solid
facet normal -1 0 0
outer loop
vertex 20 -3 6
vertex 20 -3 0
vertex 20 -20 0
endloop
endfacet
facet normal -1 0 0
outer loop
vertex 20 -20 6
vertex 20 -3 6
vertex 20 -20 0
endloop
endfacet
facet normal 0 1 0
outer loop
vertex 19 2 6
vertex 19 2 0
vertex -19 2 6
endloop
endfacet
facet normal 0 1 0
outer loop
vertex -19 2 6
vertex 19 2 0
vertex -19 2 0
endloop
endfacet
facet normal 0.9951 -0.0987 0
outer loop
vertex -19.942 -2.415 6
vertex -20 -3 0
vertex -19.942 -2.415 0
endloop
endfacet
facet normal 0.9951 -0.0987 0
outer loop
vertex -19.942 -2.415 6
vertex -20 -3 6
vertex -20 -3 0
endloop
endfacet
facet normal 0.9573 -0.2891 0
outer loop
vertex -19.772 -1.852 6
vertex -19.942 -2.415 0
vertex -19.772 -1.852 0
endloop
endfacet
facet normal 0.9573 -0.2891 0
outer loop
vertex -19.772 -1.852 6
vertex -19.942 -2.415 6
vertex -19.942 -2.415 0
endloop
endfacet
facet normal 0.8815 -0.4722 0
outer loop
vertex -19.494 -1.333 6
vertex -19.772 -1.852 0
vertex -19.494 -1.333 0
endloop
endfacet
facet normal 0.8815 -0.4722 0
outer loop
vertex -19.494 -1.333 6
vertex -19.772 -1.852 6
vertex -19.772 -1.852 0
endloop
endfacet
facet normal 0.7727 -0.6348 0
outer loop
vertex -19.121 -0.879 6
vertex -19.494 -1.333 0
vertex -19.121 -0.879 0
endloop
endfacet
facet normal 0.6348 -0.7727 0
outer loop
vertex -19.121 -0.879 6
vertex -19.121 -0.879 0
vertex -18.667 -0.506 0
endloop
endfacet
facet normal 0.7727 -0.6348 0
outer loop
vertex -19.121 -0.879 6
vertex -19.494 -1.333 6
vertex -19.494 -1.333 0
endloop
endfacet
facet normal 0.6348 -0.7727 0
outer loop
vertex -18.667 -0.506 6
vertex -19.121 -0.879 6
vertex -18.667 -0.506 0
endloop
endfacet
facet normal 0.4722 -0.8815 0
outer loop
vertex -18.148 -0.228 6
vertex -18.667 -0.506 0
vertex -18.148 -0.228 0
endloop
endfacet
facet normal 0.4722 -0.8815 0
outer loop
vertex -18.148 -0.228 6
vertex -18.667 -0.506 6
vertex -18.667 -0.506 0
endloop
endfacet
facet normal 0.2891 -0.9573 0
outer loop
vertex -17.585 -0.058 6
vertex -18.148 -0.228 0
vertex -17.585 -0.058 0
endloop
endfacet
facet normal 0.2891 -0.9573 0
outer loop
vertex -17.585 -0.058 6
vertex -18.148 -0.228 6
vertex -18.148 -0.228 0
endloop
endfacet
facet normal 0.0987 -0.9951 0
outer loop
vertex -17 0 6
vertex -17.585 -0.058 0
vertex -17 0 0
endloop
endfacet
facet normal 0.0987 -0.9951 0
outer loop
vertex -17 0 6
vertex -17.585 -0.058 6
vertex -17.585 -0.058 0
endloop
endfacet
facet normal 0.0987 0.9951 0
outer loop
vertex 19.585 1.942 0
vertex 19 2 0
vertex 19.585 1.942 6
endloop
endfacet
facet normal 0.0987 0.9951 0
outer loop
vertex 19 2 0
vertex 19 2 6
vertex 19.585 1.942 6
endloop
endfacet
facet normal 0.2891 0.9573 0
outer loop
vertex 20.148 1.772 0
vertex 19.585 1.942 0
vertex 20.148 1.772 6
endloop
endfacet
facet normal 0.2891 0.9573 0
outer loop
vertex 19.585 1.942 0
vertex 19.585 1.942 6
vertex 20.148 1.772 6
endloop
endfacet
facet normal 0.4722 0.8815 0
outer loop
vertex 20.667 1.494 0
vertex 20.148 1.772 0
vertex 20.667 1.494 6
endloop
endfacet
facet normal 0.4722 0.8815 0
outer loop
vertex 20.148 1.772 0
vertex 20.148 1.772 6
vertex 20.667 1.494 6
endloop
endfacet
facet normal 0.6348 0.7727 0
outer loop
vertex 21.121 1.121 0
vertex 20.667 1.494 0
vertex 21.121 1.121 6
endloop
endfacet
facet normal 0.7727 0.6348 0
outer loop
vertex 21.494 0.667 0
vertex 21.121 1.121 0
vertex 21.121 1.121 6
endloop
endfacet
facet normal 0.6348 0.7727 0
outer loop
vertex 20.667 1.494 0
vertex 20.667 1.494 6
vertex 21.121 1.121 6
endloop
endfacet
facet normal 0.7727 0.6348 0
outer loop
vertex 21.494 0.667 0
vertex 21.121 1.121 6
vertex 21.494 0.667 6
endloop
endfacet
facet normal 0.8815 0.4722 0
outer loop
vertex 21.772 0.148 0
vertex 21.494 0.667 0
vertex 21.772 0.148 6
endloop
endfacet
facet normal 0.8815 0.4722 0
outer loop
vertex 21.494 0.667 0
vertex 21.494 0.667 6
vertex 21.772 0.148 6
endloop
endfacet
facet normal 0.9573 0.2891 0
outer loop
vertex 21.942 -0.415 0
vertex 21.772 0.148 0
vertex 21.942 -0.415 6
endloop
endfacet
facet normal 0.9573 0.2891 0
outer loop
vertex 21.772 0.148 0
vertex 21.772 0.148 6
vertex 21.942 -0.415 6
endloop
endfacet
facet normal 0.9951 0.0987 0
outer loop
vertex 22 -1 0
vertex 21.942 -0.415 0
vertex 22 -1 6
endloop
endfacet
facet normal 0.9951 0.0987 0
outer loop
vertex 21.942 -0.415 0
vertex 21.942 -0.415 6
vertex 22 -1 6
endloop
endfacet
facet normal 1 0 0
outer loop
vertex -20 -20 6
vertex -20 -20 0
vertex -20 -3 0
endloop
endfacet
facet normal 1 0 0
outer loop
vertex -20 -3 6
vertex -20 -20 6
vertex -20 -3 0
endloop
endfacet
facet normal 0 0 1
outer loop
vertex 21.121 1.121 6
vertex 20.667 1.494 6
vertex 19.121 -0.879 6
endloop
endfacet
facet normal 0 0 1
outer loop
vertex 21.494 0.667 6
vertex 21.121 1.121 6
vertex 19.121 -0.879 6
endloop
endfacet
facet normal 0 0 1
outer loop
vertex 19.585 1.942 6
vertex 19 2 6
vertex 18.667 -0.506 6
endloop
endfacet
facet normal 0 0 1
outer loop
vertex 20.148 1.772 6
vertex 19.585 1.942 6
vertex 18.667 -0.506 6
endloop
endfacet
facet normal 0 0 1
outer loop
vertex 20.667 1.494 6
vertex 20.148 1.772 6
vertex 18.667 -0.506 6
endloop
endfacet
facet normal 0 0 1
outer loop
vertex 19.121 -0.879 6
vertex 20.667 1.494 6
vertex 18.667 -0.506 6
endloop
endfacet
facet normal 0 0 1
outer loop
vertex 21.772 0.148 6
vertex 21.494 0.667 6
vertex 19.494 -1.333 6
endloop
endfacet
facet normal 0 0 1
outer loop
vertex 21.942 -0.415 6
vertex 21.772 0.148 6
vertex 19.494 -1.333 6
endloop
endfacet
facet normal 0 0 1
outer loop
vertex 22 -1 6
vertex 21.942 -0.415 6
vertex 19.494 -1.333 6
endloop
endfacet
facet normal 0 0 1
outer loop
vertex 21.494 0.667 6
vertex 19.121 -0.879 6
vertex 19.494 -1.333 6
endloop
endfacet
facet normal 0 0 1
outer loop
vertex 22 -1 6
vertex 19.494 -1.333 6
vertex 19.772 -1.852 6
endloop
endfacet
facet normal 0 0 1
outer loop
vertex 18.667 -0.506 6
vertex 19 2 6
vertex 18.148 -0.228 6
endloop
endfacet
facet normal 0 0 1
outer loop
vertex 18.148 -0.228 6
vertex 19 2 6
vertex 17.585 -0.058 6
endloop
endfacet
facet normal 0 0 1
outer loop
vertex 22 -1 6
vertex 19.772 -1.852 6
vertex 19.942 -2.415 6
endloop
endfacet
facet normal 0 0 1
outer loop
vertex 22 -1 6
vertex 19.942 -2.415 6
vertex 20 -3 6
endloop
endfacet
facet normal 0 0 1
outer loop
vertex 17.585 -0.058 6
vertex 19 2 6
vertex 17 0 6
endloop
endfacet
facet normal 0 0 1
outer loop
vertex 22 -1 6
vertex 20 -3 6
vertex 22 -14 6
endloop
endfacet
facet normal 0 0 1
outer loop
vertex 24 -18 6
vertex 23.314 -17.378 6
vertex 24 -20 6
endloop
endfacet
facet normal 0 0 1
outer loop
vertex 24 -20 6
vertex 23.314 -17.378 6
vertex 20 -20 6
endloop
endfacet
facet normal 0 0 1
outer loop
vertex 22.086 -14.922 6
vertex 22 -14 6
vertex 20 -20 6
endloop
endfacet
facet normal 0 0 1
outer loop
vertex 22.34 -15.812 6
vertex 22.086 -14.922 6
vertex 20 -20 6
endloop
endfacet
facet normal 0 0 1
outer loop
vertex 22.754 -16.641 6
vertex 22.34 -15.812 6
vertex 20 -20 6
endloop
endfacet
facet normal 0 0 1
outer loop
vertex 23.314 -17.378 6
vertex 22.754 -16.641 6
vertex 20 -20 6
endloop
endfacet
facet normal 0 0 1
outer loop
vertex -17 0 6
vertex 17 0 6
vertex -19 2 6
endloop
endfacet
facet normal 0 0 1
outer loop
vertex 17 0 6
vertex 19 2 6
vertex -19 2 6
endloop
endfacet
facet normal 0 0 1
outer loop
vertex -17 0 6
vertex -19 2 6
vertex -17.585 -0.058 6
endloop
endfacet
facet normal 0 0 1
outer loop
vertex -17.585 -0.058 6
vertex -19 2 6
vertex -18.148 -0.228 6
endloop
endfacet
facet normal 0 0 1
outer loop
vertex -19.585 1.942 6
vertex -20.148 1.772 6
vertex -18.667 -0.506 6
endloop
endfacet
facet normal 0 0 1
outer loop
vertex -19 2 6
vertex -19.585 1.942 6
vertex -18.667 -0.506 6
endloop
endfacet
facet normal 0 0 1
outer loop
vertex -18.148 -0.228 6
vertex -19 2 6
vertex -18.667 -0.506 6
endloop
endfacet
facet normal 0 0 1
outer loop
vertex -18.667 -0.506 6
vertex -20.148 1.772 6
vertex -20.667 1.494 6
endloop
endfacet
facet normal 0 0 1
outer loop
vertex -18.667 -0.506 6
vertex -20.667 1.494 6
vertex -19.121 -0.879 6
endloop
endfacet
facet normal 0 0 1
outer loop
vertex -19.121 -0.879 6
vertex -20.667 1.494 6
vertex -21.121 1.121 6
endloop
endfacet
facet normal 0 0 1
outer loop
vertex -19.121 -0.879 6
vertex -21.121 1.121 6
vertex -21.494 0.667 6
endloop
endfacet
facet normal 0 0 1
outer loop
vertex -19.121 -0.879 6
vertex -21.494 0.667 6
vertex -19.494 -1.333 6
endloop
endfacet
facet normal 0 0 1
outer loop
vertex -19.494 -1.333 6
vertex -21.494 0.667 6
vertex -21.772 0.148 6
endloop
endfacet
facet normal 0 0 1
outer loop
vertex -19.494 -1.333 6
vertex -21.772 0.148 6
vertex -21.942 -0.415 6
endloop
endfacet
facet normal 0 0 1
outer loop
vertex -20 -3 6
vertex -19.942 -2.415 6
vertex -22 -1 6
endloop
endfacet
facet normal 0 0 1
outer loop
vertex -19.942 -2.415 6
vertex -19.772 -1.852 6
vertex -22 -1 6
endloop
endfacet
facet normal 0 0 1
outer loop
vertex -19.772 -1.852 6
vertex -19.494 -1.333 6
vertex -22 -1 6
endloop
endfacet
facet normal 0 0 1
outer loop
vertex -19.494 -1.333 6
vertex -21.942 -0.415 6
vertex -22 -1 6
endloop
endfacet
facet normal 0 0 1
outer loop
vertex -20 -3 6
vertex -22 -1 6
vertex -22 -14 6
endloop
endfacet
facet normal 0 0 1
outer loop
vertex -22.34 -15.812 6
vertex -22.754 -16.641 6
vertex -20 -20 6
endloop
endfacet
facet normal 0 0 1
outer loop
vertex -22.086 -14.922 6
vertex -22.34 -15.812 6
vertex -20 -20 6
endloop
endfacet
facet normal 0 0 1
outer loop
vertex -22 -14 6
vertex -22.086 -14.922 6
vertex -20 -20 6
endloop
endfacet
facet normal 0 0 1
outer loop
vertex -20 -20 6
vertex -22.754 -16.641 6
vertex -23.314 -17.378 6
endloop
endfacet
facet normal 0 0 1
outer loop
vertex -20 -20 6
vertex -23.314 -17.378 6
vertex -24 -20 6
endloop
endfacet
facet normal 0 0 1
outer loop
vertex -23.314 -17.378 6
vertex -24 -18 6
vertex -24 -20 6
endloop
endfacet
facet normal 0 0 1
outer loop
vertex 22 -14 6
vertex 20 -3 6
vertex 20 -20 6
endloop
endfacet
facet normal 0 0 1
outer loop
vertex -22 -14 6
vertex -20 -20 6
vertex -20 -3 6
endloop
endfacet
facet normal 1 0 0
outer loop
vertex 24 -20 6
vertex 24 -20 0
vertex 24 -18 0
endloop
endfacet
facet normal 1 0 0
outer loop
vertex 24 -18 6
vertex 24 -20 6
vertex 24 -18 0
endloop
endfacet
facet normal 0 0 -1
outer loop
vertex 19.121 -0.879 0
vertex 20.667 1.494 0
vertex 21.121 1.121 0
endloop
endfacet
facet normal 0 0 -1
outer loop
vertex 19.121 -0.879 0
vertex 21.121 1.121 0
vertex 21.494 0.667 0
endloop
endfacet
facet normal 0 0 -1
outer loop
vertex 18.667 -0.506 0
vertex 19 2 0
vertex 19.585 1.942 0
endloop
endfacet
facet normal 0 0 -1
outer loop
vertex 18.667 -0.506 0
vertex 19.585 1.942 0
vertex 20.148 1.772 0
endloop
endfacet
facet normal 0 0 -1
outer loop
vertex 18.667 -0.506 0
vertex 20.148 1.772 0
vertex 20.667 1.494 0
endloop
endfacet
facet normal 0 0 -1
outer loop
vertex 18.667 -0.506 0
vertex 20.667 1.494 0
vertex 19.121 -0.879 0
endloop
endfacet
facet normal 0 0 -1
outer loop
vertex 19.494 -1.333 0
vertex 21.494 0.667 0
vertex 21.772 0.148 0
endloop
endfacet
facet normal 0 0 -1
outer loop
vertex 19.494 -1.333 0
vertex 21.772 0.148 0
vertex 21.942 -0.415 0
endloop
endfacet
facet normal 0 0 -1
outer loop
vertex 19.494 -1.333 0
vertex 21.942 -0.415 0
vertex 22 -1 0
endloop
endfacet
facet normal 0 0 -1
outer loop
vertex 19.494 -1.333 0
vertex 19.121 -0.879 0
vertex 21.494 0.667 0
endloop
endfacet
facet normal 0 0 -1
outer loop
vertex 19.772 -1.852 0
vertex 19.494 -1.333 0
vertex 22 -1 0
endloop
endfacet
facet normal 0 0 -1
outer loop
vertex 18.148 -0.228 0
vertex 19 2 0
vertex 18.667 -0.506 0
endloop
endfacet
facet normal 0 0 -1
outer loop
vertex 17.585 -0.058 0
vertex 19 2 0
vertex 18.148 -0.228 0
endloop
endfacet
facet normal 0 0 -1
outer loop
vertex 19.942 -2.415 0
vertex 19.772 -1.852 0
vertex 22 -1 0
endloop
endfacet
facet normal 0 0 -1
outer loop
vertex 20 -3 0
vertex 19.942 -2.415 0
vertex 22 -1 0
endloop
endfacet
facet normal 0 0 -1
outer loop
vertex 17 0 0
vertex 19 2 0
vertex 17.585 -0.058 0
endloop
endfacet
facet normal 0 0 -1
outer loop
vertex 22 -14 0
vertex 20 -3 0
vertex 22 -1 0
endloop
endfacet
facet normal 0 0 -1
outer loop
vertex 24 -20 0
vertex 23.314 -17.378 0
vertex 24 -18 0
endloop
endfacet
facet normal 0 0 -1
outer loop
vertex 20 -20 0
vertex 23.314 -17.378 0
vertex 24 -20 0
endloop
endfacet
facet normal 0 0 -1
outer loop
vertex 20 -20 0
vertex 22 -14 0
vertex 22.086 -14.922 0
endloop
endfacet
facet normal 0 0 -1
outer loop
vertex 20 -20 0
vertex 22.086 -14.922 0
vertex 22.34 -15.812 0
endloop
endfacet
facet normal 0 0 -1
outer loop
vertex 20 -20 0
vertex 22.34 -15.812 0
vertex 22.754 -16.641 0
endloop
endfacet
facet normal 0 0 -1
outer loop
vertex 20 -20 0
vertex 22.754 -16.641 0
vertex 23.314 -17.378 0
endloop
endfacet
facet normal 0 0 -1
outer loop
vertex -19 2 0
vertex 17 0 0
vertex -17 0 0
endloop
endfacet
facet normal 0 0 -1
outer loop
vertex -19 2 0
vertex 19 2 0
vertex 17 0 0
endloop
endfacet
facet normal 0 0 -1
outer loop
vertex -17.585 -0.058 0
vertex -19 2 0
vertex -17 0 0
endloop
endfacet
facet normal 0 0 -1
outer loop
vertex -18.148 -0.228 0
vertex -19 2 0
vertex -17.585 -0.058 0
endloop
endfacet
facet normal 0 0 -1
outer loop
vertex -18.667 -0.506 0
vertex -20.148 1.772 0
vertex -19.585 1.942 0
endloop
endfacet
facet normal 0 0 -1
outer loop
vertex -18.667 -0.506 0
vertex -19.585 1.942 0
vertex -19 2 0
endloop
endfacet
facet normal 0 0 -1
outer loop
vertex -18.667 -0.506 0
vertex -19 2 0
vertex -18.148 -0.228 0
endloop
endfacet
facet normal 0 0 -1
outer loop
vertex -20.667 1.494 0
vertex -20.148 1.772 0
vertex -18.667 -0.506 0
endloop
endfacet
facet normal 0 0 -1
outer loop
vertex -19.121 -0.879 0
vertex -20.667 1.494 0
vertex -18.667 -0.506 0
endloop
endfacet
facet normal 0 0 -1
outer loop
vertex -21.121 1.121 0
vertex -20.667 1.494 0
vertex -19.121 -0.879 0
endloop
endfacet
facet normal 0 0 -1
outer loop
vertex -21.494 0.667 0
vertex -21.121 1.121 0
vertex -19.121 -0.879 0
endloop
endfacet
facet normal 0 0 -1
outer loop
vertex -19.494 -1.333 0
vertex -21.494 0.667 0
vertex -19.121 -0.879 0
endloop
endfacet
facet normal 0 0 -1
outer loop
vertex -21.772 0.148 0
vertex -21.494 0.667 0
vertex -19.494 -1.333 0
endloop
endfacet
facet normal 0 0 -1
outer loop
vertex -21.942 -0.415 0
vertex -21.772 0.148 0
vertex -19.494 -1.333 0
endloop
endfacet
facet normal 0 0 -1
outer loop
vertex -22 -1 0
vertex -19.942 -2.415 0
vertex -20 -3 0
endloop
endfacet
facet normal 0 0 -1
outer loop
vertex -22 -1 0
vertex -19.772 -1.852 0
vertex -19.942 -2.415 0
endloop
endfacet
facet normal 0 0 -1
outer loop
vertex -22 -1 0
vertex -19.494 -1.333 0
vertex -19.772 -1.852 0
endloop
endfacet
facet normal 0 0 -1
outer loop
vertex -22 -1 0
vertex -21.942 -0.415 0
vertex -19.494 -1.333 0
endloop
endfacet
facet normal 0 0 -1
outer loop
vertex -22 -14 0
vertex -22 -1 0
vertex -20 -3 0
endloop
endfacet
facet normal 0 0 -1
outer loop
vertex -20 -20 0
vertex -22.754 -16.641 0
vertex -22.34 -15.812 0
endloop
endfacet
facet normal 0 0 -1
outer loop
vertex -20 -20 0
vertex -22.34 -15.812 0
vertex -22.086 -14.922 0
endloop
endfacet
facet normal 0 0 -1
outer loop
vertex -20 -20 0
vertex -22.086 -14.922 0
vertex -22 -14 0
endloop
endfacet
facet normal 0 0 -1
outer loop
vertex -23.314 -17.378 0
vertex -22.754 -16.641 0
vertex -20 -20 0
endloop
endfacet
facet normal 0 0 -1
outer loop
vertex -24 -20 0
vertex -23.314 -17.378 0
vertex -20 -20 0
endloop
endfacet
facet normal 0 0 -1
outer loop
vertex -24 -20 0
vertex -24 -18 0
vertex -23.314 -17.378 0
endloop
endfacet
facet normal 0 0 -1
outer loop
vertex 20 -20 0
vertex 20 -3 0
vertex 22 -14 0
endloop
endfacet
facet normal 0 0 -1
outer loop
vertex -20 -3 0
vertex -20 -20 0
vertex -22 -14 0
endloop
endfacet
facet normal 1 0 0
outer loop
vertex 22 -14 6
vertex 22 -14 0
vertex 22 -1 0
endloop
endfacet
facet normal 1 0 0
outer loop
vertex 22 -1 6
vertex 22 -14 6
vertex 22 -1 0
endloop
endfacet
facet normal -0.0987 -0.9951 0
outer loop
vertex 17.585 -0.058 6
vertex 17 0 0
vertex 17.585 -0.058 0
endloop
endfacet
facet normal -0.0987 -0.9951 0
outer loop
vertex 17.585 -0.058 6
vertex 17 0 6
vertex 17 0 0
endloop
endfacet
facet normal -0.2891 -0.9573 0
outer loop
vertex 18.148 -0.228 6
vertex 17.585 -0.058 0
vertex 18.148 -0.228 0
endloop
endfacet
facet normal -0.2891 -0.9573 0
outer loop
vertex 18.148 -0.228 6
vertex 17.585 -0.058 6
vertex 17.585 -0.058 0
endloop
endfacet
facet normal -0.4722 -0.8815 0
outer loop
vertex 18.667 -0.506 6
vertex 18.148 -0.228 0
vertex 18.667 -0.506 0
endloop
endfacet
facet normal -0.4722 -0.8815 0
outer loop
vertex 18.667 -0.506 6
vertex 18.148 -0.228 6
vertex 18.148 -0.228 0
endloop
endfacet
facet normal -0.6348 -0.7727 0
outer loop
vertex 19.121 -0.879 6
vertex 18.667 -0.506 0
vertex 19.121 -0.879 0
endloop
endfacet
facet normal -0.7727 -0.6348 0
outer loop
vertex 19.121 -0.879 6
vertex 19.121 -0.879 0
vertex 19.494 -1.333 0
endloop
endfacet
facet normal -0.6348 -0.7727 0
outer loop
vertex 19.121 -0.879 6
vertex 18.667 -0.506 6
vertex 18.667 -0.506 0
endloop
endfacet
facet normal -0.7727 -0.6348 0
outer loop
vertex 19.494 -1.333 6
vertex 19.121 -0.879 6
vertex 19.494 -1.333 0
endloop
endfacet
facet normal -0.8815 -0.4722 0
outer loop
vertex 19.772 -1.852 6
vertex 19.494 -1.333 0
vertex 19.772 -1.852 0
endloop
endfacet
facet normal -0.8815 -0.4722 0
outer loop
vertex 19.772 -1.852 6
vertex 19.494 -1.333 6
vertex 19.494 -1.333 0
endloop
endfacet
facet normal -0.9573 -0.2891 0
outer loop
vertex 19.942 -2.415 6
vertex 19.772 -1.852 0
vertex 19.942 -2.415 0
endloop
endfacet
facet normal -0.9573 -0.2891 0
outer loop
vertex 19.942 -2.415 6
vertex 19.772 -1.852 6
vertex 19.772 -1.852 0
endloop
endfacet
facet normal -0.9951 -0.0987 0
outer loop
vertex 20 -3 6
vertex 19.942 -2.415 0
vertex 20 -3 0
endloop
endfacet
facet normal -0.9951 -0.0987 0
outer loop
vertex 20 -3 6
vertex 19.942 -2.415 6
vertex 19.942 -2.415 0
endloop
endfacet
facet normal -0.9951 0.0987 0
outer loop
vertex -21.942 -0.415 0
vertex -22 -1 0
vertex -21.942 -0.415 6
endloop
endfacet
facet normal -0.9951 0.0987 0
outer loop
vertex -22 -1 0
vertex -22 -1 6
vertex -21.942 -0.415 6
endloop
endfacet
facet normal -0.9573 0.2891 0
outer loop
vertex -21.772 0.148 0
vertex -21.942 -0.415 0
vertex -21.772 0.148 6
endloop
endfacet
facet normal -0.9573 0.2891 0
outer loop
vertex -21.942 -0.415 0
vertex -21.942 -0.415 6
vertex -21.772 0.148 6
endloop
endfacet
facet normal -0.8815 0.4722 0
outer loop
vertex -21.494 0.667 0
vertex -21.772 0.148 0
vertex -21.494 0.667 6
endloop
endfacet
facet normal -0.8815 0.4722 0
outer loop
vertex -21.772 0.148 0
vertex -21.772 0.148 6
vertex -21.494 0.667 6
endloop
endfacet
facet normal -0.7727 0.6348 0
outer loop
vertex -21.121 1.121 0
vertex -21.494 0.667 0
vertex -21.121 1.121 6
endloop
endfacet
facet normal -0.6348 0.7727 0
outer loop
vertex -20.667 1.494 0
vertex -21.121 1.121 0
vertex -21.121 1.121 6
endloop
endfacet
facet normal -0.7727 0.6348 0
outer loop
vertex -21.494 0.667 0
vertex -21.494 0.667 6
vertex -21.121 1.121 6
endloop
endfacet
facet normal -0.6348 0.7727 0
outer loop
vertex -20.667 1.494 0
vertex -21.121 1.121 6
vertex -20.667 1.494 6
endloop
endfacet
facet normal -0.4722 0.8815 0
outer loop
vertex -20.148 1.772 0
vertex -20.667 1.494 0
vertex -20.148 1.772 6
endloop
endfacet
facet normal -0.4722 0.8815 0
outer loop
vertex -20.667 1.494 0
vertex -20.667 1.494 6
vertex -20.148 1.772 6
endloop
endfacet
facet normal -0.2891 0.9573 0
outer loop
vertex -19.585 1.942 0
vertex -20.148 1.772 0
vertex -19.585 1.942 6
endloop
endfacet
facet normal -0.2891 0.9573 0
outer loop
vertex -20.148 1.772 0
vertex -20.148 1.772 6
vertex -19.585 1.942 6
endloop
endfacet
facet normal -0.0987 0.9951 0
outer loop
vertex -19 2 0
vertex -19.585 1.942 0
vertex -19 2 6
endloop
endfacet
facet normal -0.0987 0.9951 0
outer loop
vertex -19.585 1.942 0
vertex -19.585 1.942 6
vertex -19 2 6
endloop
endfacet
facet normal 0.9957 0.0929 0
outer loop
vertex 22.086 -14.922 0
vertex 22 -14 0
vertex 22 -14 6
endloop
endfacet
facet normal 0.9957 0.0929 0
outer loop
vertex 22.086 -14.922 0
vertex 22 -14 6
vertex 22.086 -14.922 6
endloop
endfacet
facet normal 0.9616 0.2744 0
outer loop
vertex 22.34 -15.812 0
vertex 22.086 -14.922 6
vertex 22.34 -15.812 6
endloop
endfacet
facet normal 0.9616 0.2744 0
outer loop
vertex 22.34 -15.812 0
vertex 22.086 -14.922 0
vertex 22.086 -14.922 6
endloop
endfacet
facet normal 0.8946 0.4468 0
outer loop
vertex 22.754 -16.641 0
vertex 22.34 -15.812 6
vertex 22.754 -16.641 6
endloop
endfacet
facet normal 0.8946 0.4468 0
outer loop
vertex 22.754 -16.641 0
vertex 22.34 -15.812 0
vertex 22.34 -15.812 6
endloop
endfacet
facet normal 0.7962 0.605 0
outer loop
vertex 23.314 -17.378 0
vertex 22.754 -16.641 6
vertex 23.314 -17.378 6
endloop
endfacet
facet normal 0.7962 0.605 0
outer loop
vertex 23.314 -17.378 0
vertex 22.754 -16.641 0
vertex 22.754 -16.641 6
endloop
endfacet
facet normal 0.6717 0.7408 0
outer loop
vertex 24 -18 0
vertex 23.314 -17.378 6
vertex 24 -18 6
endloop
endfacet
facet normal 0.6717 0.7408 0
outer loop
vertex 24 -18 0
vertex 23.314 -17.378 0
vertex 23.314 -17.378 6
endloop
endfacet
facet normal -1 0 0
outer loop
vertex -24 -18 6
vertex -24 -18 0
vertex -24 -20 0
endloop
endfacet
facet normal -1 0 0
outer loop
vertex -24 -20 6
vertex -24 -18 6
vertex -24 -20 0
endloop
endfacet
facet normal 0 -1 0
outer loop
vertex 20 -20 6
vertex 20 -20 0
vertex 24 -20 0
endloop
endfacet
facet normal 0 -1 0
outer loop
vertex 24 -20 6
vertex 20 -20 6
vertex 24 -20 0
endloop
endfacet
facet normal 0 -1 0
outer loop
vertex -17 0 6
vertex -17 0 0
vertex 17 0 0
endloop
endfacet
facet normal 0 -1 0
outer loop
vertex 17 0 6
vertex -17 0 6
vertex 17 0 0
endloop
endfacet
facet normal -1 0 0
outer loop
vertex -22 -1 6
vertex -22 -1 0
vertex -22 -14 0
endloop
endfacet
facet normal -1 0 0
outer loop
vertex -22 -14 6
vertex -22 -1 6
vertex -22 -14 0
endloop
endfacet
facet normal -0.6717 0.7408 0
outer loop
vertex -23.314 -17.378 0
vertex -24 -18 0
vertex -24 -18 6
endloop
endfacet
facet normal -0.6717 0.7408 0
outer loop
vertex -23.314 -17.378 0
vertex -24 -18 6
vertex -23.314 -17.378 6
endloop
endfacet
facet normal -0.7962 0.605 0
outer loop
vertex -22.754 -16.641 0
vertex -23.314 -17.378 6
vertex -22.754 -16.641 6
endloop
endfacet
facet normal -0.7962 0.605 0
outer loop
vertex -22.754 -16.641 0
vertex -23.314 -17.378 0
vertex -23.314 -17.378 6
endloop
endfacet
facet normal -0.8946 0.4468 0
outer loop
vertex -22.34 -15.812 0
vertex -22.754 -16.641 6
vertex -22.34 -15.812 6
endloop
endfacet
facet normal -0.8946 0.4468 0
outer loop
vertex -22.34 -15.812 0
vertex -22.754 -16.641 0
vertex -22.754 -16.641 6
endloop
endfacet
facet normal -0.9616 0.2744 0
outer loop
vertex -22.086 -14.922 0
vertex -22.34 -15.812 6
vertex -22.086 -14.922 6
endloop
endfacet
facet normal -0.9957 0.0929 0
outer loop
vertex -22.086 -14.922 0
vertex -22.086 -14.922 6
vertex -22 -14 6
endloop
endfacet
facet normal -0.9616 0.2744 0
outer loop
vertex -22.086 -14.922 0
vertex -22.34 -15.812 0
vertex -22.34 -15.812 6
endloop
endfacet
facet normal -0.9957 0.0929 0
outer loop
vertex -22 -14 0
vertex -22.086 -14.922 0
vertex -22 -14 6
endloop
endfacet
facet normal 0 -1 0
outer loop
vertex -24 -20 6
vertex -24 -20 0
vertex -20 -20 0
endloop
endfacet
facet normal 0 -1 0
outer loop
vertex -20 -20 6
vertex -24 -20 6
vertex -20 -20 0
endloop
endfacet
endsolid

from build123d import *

# Parameters (mm, degrees)
EXTRUDE_1_DEPTH = 6
FILLET_1_R      = 5
FILLET_2_R      = 3


with BuildPart() as part:
    # 草图1 → 凸台-拉伸1 (new body)
    with BuildSketch(Plane.XY):
        Polygon((-20, 0), (20, 0), (20, -20), (24, -20), (24, -18), (22, -18), (22, 2), (-22, 2), (-22, -18), (-24, -18), (-24, -20), (-20, -20), align=None)
    extrude(amount=EXTRUDE_1_DEPTH)

    # 圆角1
    # the kernel refuses this fillet: 5 mm, written as the material it adds along each edge
    with BuildSketch(Plane(origin=(22, -18, 0), x_dir=(1, 0, 0), z_dir=(0, 0, 1))) as fillet_1_piece_1:
        with BuildLine():
            CenterArc((5, 4), FILLET_1_R, 180, 53.130102354)
            Line((0, 4), (-0.1, 4))
            Line((-0.1, 4), (-0.1, 0))
            Line((-0.1, 0), (0, -0.1))
            ThreePointArc((0, -0.1), (1, -0.1), (1.94, -0.08))
            Line((1.94, -0.08), (2, 0))
        make_face()
    extrude(amount=6)
    with BuildSketch(Plane(origin=(-22, -18, 0), x_dir=(0, 1, 0), z_dir=(0, 0, 1))) as fillet_1_piece_2:
        with BuildLine():
            CenterArc((4, 5), FILLET_1_R, 216.869897646, 53.130102354)
            Line((0, 2), (-0.08, 1.94))
            ThreePointArc((-0.08, 1.94), (-0.1, 1), (-0.1, 0))
            Line((-0.1, 0), (0, -0.1))
            Line((0, -0.1), (4, -0.1))
            Line((4, -0.1), (4, 0))
        make_face()
    extrude(amount=6)

    # 圆角2
    fillet_2_edges = [part.edges().sort_by_distance(p)[0] for p in [
        (20, 0, 3),
        (-20, 0, 3),
        (-22, 2, 3),
        (22, 2, 3),
    ]]
    fillet(fillet_2_edges, radius=FILLET_2_R)


solid = part.part
